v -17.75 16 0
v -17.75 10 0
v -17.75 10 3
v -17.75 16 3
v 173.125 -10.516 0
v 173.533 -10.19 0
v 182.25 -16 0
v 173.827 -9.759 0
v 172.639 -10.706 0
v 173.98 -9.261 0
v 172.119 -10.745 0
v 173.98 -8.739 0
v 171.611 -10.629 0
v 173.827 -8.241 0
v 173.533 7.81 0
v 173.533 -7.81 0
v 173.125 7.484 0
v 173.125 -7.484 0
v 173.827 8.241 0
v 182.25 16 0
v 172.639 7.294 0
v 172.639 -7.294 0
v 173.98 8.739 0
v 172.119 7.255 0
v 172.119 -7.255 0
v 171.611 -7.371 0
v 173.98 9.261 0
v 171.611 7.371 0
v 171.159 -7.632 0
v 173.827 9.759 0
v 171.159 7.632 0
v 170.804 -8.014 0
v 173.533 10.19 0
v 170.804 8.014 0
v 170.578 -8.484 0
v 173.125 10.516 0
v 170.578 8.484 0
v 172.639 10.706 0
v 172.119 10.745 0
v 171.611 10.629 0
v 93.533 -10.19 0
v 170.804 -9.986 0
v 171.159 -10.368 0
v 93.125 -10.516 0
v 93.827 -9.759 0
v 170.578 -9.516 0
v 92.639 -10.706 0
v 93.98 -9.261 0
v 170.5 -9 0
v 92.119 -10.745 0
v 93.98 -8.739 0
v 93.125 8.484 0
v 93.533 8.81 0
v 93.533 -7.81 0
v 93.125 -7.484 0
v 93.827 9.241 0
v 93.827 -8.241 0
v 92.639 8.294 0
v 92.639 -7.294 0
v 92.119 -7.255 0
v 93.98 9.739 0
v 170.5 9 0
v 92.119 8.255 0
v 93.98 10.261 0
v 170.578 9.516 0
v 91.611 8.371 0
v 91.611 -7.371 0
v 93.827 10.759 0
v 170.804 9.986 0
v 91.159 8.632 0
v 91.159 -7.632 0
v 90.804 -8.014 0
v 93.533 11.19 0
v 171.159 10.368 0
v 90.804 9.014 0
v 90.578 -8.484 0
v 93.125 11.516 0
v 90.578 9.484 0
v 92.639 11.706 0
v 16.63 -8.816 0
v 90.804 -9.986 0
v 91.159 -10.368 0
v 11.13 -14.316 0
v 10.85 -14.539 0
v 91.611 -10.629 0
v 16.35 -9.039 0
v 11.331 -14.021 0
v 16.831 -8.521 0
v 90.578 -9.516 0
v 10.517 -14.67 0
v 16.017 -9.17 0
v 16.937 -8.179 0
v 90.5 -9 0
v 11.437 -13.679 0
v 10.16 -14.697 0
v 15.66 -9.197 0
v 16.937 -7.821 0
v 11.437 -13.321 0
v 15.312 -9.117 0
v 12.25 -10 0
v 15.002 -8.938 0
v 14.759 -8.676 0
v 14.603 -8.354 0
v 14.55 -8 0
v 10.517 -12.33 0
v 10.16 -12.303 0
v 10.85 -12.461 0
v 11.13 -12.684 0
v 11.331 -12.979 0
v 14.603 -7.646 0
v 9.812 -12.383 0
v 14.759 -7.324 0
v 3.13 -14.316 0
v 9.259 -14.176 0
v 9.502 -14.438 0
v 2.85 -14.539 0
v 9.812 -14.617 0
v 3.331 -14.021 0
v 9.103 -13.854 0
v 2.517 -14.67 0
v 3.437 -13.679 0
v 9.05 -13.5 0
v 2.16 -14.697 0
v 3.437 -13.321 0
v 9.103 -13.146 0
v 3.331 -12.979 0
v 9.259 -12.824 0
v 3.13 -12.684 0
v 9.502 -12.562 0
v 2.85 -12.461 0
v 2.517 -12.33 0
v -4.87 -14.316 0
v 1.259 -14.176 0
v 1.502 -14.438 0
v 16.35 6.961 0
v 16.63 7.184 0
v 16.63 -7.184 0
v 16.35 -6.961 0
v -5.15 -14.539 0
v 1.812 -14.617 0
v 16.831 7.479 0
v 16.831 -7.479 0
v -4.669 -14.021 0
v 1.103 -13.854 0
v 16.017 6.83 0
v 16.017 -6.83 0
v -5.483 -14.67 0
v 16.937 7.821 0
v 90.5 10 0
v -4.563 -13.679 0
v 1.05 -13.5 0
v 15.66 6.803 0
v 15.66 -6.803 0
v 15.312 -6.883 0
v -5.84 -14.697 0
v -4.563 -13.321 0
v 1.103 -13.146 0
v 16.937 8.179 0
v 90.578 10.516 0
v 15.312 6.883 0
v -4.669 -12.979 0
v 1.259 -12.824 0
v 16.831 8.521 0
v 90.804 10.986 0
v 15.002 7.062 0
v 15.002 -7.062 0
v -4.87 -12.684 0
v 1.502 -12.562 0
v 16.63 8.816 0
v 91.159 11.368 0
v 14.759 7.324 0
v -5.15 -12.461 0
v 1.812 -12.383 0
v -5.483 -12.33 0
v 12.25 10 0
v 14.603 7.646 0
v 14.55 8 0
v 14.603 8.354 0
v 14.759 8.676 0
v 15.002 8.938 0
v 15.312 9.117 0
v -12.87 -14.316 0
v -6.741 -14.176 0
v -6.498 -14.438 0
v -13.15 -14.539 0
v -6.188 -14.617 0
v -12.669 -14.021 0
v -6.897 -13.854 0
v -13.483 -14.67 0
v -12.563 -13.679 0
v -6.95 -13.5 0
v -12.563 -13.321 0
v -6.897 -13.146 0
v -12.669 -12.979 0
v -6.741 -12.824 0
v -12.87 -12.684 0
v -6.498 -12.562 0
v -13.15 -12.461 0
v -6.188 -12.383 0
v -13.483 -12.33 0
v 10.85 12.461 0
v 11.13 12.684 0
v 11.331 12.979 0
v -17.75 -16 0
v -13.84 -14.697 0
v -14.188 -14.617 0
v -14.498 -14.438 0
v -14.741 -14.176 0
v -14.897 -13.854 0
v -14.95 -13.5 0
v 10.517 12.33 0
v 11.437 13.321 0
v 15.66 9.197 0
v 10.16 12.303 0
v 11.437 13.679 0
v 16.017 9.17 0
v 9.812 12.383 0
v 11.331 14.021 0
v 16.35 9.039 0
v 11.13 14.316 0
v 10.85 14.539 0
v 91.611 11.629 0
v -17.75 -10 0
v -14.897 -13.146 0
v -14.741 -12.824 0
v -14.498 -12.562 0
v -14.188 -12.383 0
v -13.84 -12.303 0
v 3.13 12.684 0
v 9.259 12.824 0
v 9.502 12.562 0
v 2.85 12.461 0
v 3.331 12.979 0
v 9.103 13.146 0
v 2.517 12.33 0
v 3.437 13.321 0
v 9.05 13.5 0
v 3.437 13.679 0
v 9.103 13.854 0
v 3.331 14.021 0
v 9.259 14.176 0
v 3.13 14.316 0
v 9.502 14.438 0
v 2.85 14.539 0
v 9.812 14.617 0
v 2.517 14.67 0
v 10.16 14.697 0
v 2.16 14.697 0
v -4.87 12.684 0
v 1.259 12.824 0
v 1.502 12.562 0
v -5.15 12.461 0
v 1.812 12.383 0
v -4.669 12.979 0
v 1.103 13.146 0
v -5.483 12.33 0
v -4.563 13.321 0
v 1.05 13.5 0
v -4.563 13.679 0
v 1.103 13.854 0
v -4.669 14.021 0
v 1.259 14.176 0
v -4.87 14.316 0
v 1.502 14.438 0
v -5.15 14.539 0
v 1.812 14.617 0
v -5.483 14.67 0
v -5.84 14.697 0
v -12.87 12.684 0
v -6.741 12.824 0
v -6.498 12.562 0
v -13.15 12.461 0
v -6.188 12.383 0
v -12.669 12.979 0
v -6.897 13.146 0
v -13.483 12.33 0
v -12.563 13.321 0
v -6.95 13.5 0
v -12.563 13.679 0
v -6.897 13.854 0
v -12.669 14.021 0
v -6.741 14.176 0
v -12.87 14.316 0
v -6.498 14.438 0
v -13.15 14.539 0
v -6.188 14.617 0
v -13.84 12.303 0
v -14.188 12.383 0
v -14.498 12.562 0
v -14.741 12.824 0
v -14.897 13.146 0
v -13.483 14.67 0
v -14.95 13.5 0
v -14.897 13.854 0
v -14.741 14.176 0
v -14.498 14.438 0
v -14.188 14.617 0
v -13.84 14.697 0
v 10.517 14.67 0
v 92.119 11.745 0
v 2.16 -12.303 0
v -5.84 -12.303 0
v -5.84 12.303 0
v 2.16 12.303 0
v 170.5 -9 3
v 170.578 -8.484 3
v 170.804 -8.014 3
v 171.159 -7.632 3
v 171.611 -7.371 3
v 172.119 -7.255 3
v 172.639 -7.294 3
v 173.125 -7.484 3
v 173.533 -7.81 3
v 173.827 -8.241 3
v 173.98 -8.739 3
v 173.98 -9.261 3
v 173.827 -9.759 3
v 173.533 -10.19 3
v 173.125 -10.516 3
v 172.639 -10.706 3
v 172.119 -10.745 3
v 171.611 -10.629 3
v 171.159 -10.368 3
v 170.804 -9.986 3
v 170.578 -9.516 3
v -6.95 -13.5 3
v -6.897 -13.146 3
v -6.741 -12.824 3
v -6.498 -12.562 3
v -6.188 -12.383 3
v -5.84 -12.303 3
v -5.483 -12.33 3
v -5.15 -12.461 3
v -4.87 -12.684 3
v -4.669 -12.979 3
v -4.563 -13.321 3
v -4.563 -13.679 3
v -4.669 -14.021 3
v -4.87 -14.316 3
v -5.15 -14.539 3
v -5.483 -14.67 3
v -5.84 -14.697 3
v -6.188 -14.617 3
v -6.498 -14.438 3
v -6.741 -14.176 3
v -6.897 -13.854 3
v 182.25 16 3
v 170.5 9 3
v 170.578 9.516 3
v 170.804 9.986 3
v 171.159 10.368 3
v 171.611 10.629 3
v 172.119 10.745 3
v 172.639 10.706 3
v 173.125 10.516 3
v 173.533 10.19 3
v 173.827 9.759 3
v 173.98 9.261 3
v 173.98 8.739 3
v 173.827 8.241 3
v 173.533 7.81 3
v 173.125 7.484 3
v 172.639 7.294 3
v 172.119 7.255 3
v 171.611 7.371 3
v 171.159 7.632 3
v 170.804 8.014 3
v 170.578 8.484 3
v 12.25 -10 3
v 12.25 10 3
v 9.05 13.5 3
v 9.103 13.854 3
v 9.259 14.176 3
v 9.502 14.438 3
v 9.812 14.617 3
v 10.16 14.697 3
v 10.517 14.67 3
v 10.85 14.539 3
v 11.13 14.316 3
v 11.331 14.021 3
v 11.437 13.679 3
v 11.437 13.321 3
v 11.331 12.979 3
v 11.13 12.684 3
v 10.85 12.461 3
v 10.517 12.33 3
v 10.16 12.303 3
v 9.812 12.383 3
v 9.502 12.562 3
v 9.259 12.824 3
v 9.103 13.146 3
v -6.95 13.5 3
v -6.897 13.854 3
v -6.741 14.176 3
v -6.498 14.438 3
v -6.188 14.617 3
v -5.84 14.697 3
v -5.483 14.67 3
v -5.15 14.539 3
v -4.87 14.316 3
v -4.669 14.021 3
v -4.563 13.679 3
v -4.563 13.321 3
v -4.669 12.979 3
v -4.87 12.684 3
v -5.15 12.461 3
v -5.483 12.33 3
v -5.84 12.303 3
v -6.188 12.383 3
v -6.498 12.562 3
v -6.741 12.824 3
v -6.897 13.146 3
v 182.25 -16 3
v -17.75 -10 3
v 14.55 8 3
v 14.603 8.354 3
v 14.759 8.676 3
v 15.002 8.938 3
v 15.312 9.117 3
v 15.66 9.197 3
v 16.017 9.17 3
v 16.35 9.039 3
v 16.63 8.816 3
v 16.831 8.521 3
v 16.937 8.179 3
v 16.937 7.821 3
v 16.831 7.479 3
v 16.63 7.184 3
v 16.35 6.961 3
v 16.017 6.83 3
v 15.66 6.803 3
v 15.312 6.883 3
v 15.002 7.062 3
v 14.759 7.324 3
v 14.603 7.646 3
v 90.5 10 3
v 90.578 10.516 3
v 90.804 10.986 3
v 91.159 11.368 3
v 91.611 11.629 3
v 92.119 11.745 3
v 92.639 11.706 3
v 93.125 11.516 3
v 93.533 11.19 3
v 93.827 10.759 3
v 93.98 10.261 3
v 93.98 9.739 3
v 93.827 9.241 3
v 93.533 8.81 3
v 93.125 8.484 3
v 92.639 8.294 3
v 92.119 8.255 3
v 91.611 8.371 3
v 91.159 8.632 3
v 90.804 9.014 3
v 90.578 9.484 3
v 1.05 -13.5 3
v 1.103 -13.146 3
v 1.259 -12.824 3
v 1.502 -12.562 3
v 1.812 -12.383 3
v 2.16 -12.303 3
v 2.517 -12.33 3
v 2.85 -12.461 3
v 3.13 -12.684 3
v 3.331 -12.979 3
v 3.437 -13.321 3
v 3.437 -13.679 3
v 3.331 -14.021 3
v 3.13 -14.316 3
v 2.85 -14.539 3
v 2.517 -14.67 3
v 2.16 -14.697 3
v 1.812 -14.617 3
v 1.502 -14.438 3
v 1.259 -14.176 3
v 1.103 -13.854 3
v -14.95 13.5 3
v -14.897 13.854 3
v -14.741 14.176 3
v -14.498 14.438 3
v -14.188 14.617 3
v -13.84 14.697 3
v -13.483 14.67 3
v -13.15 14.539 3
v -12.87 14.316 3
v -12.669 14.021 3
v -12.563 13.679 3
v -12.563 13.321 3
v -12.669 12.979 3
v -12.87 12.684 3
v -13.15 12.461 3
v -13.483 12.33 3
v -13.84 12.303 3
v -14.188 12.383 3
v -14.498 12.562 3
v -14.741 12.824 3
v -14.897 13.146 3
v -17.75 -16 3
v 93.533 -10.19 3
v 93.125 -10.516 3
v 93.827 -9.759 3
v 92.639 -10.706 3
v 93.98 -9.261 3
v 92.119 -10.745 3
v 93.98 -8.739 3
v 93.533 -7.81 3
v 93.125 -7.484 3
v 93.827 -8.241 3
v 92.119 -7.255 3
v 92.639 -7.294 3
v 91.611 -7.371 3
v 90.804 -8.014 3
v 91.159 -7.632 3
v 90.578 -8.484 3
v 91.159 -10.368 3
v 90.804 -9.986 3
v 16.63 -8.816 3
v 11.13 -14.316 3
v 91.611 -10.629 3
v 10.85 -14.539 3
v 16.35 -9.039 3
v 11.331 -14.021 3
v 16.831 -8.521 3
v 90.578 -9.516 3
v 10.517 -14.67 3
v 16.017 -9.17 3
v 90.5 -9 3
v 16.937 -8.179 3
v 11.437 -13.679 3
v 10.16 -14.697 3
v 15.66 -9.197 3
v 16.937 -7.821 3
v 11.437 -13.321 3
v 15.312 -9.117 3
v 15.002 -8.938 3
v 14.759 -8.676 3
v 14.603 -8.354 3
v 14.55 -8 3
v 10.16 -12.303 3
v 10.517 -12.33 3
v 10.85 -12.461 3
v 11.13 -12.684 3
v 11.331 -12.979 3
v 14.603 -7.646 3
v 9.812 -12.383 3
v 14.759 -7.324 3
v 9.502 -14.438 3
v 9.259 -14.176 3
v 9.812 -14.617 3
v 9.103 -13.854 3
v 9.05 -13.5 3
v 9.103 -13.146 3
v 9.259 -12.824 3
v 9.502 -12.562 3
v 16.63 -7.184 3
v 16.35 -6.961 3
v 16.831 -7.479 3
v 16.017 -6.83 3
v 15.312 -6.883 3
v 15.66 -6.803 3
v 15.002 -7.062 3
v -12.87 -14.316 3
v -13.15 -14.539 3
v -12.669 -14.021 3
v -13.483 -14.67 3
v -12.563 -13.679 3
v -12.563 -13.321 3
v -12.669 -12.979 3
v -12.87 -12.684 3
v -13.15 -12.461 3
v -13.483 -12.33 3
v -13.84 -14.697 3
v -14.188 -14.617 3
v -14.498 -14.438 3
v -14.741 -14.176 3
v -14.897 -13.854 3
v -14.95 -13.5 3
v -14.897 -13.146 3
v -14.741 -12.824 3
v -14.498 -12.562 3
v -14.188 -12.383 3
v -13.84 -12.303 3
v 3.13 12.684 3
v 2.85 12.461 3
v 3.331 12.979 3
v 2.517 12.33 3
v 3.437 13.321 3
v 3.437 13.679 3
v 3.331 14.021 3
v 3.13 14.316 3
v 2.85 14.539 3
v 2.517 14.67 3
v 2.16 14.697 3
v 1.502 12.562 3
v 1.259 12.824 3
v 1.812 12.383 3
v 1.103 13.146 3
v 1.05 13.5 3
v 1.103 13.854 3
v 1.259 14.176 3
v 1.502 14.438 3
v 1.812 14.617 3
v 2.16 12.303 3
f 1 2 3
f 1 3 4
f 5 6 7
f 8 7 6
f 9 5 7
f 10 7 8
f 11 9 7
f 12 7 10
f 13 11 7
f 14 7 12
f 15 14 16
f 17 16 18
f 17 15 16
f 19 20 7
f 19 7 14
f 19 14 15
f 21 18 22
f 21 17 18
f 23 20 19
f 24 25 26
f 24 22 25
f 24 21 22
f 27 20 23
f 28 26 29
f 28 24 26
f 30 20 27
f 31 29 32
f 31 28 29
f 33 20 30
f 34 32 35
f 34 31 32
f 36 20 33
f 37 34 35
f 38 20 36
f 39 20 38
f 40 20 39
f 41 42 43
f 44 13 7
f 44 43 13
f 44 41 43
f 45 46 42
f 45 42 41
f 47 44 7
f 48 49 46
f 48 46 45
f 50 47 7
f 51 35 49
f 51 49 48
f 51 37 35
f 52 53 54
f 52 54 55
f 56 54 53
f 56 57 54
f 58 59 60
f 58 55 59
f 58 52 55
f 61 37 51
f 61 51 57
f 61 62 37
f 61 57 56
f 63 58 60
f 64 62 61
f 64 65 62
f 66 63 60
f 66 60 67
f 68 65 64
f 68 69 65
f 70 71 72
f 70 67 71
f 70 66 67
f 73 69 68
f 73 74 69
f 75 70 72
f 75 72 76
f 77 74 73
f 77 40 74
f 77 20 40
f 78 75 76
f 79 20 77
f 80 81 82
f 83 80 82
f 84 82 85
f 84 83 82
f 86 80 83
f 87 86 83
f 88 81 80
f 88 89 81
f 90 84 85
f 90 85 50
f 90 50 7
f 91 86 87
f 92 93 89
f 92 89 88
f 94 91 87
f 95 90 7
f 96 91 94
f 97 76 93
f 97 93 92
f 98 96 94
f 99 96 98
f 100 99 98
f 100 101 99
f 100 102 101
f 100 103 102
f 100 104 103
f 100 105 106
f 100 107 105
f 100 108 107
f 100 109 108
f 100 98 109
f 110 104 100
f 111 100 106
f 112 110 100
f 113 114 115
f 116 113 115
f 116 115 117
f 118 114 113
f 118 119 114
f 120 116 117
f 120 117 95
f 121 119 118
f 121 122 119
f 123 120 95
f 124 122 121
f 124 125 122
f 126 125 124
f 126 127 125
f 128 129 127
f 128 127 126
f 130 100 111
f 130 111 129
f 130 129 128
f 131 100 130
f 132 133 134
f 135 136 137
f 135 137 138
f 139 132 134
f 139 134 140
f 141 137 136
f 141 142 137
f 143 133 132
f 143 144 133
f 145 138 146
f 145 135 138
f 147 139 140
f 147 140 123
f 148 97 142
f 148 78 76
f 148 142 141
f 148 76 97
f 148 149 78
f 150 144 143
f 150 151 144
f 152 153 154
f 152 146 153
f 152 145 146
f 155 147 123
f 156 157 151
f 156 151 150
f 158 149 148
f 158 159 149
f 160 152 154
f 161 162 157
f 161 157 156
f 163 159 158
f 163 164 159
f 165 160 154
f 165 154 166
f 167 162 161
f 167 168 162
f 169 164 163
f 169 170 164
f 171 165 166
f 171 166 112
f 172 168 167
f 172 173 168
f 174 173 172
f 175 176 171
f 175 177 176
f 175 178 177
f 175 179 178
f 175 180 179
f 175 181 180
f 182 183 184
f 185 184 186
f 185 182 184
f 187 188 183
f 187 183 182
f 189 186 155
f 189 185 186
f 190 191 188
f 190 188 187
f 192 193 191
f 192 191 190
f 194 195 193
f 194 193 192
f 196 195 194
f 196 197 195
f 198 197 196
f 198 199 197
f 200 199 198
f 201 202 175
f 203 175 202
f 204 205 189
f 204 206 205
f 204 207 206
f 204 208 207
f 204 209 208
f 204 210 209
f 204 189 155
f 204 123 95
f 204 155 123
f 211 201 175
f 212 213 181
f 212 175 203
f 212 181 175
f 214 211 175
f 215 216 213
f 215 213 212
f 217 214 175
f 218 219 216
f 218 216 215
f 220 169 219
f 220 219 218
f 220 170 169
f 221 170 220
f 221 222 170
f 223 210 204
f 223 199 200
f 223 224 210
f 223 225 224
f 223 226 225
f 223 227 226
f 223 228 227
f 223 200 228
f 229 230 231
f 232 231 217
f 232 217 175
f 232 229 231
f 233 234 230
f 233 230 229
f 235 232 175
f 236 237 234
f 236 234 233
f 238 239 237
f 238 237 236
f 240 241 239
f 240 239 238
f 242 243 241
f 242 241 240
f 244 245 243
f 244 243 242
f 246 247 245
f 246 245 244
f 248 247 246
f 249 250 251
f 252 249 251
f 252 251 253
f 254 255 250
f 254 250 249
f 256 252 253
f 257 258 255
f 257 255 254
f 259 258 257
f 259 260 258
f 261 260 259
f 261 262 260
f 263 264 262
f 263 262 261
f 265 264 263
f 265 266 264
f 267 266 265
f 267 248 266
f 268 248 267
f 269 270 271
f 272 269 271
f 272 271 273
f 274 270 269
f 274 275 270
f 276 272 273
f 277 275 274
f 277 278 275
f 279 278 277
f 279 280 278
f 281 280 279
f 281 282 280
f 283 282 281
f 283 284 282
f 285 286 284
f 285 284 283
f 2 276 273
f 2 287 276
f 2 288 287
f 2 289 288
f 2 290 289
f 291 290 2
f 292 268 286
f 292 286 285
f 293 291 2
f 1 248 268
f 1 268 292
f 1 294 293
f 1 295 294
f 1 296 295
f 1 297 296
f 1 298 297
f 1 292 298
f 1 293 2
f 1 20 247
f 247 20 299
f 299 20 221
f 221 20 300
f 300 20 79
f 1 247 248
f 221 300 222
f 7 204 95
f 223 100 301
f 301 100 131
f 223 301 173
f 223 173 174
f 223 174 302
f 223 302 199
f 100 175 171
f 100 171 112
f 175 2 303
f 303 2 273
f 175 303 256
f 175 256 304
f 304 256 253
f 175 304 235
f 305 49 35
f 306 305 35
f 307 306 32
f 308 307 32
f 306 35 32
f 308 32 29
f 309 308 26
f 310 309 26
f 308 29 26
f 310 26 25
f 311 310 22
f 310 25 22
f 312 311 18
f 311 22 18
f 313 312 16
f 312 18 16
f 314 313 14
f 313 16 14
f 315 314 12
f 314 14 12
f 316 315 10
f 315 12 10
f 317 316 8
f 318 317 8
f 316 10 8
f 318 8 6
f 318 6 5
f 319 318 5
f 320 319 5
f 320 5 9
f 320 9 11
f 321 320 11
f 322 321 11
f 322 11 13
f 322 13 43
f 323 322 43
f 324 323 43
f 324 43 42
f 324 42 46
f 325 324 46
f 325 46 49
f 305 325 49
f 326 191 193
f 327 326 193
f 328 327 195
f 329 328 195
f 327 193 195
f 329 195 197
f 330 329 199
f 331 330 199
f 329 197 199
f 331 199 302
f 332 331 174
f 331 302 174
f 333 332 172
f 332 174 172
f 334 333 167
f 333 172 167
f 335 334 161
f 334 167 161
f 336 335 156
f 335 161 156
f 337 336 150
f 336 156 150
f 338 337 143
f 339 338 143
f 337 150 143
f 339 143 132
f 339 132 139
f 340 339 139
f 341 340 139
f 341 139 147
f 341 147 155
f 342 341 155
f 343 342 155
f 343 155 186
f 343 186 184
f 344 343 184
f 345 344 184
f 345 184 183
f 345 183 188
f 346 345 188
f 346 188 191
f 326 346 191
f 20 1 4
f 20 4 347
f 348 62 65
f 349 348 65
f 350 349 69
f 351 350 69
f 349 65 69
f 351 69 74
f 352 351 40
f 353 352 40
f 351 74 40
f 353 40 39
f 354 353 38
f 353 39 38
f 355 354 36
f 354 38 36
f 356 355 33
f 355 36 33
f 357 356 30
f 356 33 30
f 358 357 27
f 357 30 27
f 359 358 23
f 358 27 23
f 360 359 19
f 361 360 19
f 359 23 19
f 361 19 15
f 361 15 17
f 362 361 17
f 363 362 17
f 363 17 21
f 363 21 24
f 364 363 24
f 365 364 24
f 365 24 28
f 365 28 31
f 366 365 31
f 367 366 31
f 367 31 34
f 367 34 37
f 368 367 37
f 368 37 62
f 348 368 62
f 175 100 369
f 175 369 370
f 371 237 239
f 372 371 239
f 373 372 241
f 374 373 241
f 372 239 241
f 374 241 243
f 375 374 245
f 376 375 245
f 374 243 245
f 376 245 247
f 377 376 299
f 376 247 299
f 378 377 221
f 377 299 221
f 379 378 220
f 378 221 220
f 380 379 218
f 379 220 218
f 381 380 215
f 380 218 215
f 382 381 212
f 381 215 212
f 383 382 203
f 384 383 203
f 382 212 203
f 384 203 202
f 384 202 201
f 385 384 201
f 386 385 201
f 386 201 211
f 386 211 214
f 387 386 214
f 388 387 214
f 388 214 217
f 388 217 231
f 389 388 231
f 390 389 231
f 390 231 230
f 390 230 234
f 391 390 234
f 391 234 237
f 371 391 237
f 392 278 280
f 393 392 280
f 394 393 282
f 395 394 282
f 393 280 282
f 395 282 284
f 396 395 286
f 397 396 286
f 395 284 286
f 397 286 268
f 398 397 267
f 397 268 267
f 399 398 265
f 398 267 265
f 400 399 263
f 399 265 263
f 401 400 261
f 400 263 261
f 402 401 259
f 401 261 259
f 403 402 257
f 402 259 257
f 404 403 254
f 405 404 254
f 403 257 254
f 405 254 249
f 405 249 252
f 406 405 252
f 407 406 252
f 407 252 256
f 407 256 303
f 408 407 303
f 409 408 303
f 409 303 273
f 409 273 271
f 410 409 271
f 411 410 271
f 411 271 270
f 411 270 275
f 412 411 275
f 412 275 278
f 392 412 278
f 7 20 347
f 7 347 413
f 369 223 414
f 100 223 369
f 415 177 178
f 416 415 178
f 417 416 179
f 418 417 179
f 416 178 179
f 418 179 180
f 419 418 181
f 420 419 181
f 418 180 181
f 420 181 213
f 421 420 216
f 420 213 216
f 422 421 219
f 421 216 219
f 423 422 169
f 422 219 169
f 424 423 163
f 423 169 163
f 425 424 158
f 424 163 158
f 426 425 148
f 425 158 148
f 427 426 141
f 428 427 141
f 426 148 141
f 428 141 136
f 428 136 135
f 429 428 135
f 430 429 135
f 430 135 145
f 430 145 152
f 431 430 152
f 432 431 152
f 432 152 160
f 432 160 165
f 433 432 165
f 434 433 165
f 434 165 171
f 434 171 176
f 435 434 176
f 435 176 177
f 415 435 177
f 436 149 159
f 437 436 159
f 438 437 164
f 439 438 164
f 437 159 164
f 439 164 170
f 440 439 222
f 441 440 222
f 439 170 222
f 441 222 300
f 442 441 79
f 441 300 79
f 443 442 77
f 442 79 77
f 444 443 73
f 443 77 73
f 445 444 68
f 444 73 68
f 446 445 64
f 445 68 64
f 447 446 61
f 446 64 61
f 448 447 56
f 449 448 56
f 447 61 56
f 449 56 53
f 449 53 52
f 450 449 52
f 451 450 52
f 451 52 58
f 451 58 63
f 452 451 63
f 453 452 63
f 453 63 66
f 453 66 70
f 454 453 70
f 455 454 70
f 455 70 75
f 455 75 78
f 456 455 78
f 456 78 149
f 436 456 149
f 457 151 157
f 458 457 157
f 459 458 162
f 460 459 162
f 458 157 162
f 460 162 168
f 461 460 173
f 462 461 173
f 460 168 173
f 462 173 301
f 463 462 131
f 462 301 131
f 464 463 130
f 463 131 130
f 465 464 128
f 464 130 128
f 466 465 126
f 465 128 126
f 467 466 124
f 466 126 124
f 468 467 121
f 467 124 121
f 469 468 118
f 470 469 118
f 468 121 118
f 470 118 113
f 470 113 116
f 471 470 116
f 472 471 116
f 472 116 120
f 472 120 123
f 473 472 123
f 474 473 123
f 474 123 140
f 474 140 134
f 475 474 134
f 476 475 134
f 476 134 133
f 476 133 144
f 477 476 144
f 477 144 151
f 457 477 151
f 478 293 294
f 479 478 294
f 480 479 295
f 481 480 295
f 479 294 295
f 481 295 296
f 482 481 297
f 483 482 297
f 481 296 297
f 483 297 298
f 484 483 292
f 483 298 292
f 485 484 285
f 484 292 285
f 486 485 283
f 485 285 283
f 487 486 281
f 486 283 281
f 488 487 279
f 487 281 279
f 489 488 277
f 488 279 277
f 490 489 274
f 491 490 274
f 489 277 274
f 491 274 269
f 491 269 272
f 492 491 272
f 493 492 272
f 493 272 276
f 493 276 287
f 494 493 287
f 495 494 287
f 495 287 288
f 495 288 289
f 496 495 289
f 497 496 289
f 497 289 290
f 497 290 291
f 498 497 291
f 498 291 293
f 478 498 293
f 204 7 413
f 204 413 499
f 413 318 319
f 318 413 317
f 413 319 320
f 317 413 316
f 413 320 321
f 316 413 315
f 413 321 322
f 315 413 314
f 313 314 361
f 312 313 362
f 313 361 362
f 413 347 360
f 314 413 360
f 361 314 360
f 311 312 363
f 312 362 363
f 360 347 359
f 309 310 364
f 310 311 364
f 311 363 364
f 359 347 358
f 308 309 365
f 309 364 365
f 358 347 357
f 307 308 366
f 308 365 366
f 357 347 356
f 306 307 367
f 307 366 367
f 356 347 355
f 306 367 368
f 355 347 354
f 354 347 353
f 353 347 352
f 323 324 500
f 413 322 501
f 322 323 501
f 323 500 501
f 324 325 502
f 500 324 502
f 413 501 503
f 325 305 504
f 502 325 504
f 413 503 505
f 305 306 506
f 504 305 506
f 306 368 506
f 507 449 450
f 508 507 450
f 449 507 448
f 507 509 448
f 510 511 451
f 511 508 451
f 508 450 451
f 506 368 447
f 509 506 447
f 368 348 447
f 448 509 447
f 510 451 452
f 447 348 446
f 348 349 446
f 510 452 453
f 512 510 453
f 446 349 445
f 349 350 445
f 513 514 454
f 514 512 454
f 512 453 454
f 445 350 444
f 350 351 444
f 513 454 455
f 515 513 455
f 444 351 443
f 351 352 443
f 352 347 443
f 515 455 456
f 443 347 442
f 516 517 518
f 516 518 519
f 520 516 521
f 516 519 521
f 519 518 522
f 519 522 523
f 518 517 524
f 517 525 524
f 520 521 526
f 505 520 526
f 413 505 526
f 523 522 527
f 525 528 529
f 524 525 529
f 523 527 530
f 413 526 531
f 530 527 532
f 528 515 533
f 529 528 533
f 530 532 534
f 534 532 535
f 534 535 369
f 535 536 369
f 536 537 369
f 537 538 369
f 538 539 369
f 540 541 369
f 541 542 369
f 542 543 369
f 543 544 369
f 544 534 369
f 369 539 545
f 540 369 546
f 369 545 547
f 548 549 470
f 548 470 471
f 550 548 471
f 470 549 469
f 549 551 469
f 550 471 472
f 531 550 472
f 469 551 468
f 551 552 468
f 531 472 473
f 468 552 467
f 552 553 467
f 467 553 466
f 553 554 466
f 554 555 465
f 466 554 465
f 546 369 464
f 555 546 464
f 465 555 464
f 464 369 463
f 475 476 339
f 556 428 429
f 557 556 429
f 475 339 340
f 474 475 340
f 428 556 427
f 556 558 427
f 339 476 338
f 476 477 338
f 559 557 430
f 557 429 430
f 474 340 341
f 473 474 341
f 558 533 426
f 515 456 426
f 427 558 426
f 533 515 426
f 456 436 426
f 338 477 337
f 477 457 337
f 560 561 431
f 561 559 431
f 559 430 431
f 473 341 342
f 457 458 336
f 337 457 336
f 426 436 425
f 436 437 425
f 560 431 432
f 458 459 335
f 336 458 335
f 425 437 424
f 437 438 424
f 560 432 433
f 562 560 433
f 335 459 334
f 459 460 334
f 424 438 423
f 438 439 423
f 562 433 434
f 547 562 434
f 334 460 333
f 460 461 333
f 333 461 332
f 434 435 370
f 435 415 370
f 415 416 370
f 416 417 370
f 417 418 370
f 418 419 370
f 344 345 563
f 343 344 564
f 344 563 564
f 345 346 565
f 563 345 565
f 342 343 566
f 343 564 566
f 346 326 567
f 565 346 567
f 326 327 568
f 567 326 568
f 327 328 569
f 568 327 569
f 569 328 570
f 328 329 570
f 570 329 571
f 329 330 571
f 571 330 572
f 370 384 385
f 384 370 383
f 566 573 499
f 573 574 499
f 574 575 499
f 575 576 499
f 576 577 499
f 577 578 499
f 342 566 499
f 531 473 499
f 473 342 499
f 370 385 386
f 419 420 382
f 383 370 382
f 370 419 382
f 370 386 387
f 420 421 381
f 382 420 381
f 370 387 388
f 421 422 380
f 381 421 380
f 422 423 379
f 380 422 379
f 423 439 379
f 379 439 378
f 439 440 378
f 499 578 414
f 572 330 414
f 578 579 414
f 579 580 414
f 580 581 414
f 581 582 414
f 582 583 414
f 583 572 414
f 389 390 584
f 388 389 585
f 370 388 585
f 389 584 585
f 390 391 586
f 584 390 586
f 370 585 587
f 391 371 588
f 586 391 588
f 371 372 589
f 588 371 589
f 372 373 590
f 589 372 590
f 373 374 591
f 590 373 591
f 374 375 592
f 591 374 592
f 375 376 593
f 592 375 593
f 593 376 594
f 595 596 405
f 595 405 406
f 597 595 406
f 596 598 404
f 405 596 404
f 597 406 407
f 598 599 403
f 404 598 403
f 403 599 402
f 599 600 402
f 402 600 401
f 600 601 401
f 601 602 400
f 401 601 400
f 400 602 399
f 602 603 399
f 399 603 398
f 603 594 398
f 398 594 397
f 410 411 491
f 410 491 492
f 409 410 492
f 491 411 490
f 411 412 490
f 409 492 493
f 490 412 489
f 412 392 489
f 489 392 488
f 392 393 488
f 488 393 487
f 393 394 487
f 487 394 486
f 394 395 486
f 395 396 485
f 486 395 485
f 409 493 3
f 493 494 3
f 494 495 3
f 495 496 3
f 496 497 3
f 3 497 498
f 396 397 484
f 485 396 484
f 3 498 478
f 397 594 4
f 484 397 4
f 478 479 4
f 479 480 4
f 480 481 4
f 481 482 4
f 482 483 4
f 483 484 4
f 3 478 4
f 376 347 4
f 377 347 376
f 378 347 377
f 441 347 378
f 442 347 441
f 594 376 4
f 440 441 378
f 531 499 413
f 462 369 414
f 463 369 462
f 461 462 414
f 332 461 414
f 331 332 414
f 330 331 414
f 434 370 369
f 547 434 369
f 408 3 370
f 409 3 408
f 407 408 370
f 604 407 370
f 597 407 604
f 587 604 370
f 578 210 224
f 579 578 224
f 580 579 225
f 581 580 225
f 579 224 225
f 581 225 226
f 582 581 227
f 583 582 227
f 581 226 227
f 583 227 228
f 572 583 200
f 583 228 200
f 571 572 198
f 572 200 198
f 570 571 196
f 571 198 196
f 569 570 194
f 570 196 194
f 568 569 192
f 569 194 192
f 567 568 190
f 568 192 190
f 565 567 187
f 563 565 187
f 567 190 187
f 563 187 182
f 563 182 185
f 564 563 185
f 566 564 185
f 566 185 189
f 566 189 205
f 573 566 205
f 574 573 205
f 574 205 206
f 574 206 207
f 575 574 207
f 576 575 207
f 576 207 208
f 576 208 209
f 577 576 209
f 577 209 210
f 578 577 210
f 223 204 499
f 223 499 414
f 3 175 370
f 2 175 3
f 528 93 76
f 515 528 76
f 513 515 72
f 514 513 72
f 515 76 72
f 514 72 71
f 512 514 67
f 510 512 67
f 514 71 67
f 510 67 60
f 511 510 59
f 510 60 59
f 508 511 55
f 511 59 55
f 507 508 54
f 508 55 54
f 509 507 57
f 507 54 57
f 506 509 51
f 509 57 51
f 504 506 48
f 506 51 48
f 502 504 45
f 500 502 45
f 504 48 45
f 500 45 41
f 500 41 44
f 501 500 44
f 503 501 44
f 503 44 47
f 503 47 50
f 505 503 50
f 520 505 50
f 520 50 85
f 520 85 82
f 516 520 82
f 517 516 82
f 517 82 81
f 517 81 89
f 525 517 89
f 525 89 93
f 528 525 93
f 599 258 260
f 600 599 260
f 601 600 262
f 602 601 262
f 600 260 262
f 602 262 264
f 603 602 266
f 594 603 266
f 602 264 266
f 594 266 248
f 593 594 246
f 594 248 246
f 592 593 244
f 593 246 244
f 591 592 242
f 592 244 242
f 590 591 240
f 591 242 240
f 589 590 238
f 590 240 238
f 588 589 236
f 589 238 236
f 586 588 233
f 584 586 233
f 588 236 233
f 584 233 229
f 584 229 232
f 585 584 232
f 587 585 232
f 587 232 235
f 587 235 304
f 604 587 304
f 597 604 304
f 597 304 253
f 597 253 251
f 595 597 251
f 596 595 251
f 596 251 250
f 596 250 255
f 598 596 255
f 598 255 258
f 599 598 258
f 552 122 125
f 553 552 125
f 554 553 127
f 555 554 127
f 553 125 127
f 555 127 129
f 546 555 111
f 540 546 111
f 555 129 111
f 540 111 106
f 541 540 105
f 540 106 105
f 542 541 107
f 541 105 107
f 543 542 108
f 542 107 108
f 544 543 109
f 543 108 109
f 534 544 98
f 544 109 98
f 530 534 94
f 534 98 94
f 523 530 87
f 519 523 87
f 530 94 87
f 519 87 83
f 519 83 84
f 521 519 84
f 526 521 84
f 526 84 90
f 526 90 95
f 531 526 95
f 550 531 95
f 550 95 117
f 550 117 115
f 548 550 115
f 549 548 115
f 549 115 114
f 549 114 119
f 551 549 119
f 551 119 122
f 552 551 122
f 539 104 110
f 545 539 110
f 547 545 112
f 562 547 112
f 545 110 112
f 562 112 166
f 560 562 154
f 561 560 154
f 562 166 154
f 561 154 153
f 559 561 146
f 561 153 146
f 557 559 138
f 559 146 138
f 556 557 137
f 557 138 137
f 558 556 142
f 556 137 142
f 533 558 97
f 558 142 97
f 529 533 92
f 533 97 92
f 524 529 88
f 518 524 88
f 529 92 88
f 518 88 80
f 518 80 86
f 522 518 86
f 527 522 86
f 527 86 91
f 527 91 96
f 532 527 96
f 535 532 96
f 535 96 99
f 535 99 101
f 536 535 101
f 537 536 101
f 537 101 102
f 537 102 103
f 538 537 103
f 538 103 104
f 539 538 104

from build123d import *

# Parameters (mm, degrees)
BOSS_EXTRUDE1_DEPTH        = 3
M2_CLEARANCE_HOLE1_D       = 2.4
F_3_5_3_5_DIAMETER_HOLE1_D = 3.5


with BuildPart() as part:
    # Sketch1 → Boss-Extrude1 (new body)
    with BuildSketch(Plane.XY):
        Polygon((-17.75, 16), (182.25, 16), (182.25, -16), (-17.75, -16), (-17.75, -10), (12.25, -10), (12.25, 10), (-17.75, 10), align=None)
    extrude(amount=BOSS_EXTRUDE1_DEPTH)

    # M2 Clearance Hole1 (through all)
    with Locations(Plane.XY.offset(3)):
        with Locations((-13.75, 13.5), (-5.75, 13.5), (2.25, 13.5), (10.25, 13.5), (15.75, 8), (15.75, -8), (10.25, -13.5), (2.25, -13.5), (-5.75, -13.5), (-13.75, -13.5)):
            Hole(M2_CLEARANCE_HOLE1_D / 2)

    # Ø3.5 (3.5) Diameter Hole1 (through all)
    with Locations(Plane.XY.offset(3)):
        with Locations((92.25, -9), (92.25, 10), (172.25, 9), (172.25, -9)):
            Hole(F_3_5_3_5_DIAMETER_HOLE1_D / 2)


solid = part.part
